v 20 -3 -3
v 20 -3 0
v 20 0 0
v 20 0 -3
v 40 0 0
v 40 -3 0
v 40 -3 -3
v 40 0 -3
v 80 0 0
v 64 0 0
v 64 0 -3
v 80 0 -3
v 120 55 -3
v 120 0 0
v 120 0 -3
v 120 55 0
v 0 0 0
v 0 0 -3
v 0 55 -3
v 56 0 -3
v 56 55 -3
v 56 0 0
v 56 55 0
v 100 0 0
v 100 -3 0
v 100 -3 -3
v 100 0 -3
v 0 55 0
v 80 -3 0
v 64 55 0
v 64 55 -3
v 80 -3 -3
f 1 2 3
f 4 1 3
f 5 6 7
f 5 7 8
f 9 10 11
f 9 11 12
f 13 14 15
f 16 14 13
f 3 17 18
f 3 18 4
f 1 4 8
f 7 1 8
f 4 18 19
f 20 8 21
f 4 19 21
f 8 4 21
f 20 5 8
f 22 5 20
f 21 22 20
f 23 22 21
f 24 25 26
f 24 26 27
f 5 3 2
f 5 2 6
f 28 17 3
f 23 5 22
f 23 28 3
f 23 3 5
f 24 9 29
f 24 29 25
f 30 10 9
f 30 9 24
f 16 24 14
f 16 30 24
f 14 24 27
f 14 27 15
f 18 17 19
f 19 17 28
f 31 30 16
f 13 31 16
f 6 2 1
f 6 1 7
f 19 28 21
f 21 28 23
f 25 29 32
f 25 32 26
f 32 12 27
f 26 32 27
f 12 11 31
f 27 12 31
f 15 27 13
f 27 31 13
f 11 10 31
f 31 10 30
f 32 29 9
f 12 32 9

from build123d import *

# Parameters (mm, degrees)
SKETCH1_W             = 56
SKETCH1_H             = 55
BOSS_EXTRUDE1_DEPTH   = 3
BOSS_EXTRUDE1_2_DEPTH = 3
SKETCH2_W             = 20
SKETCH2_H             = 3
BOSS_EXTRUDE2_DEPTH   = 3


with BuildPart() as part:
    # Sketch1 → Boss-Extrude1 (new body)
    with BuildSketch(Plane.XY):
        with Locations((28, 27.5)):
            Rectangle(SKETCH1_W, SKETCH1_H)
    extrude(amount=-BOSS_EXTRUDE1_DEPTH)



with BuildPart() as body_2:
    # Sketch1 → Boss-Extrude1 2 (new body)
    with BuildSketch(Plane.XY):
        with Locations((92, 27.5)):
            Rectangle(SKETCH1_W, SKETCH1_H)
    extrude(amount=-BOSS_EXTRUDE1_2_DEPTH)


with BuildPart() as part_1:
    add(part.part)

    add(body_2.part)  # Boss-Extrude2 merges body 2
    # Sketch2 → Boss-Extrude2 (add)
    with BuildSketch(Plane.XY):
        with Locations((30, -1.5)):
            Rectangle(SKETCH2_W, SKETCH2_H)
        with Locations((90, -1.5)):
            Rectangle(SKETCH2_W, SKETCH2_H)
    extrude(amount=-BOSS_EXTRUDE2_DEPTH)


solid = part_1.part
